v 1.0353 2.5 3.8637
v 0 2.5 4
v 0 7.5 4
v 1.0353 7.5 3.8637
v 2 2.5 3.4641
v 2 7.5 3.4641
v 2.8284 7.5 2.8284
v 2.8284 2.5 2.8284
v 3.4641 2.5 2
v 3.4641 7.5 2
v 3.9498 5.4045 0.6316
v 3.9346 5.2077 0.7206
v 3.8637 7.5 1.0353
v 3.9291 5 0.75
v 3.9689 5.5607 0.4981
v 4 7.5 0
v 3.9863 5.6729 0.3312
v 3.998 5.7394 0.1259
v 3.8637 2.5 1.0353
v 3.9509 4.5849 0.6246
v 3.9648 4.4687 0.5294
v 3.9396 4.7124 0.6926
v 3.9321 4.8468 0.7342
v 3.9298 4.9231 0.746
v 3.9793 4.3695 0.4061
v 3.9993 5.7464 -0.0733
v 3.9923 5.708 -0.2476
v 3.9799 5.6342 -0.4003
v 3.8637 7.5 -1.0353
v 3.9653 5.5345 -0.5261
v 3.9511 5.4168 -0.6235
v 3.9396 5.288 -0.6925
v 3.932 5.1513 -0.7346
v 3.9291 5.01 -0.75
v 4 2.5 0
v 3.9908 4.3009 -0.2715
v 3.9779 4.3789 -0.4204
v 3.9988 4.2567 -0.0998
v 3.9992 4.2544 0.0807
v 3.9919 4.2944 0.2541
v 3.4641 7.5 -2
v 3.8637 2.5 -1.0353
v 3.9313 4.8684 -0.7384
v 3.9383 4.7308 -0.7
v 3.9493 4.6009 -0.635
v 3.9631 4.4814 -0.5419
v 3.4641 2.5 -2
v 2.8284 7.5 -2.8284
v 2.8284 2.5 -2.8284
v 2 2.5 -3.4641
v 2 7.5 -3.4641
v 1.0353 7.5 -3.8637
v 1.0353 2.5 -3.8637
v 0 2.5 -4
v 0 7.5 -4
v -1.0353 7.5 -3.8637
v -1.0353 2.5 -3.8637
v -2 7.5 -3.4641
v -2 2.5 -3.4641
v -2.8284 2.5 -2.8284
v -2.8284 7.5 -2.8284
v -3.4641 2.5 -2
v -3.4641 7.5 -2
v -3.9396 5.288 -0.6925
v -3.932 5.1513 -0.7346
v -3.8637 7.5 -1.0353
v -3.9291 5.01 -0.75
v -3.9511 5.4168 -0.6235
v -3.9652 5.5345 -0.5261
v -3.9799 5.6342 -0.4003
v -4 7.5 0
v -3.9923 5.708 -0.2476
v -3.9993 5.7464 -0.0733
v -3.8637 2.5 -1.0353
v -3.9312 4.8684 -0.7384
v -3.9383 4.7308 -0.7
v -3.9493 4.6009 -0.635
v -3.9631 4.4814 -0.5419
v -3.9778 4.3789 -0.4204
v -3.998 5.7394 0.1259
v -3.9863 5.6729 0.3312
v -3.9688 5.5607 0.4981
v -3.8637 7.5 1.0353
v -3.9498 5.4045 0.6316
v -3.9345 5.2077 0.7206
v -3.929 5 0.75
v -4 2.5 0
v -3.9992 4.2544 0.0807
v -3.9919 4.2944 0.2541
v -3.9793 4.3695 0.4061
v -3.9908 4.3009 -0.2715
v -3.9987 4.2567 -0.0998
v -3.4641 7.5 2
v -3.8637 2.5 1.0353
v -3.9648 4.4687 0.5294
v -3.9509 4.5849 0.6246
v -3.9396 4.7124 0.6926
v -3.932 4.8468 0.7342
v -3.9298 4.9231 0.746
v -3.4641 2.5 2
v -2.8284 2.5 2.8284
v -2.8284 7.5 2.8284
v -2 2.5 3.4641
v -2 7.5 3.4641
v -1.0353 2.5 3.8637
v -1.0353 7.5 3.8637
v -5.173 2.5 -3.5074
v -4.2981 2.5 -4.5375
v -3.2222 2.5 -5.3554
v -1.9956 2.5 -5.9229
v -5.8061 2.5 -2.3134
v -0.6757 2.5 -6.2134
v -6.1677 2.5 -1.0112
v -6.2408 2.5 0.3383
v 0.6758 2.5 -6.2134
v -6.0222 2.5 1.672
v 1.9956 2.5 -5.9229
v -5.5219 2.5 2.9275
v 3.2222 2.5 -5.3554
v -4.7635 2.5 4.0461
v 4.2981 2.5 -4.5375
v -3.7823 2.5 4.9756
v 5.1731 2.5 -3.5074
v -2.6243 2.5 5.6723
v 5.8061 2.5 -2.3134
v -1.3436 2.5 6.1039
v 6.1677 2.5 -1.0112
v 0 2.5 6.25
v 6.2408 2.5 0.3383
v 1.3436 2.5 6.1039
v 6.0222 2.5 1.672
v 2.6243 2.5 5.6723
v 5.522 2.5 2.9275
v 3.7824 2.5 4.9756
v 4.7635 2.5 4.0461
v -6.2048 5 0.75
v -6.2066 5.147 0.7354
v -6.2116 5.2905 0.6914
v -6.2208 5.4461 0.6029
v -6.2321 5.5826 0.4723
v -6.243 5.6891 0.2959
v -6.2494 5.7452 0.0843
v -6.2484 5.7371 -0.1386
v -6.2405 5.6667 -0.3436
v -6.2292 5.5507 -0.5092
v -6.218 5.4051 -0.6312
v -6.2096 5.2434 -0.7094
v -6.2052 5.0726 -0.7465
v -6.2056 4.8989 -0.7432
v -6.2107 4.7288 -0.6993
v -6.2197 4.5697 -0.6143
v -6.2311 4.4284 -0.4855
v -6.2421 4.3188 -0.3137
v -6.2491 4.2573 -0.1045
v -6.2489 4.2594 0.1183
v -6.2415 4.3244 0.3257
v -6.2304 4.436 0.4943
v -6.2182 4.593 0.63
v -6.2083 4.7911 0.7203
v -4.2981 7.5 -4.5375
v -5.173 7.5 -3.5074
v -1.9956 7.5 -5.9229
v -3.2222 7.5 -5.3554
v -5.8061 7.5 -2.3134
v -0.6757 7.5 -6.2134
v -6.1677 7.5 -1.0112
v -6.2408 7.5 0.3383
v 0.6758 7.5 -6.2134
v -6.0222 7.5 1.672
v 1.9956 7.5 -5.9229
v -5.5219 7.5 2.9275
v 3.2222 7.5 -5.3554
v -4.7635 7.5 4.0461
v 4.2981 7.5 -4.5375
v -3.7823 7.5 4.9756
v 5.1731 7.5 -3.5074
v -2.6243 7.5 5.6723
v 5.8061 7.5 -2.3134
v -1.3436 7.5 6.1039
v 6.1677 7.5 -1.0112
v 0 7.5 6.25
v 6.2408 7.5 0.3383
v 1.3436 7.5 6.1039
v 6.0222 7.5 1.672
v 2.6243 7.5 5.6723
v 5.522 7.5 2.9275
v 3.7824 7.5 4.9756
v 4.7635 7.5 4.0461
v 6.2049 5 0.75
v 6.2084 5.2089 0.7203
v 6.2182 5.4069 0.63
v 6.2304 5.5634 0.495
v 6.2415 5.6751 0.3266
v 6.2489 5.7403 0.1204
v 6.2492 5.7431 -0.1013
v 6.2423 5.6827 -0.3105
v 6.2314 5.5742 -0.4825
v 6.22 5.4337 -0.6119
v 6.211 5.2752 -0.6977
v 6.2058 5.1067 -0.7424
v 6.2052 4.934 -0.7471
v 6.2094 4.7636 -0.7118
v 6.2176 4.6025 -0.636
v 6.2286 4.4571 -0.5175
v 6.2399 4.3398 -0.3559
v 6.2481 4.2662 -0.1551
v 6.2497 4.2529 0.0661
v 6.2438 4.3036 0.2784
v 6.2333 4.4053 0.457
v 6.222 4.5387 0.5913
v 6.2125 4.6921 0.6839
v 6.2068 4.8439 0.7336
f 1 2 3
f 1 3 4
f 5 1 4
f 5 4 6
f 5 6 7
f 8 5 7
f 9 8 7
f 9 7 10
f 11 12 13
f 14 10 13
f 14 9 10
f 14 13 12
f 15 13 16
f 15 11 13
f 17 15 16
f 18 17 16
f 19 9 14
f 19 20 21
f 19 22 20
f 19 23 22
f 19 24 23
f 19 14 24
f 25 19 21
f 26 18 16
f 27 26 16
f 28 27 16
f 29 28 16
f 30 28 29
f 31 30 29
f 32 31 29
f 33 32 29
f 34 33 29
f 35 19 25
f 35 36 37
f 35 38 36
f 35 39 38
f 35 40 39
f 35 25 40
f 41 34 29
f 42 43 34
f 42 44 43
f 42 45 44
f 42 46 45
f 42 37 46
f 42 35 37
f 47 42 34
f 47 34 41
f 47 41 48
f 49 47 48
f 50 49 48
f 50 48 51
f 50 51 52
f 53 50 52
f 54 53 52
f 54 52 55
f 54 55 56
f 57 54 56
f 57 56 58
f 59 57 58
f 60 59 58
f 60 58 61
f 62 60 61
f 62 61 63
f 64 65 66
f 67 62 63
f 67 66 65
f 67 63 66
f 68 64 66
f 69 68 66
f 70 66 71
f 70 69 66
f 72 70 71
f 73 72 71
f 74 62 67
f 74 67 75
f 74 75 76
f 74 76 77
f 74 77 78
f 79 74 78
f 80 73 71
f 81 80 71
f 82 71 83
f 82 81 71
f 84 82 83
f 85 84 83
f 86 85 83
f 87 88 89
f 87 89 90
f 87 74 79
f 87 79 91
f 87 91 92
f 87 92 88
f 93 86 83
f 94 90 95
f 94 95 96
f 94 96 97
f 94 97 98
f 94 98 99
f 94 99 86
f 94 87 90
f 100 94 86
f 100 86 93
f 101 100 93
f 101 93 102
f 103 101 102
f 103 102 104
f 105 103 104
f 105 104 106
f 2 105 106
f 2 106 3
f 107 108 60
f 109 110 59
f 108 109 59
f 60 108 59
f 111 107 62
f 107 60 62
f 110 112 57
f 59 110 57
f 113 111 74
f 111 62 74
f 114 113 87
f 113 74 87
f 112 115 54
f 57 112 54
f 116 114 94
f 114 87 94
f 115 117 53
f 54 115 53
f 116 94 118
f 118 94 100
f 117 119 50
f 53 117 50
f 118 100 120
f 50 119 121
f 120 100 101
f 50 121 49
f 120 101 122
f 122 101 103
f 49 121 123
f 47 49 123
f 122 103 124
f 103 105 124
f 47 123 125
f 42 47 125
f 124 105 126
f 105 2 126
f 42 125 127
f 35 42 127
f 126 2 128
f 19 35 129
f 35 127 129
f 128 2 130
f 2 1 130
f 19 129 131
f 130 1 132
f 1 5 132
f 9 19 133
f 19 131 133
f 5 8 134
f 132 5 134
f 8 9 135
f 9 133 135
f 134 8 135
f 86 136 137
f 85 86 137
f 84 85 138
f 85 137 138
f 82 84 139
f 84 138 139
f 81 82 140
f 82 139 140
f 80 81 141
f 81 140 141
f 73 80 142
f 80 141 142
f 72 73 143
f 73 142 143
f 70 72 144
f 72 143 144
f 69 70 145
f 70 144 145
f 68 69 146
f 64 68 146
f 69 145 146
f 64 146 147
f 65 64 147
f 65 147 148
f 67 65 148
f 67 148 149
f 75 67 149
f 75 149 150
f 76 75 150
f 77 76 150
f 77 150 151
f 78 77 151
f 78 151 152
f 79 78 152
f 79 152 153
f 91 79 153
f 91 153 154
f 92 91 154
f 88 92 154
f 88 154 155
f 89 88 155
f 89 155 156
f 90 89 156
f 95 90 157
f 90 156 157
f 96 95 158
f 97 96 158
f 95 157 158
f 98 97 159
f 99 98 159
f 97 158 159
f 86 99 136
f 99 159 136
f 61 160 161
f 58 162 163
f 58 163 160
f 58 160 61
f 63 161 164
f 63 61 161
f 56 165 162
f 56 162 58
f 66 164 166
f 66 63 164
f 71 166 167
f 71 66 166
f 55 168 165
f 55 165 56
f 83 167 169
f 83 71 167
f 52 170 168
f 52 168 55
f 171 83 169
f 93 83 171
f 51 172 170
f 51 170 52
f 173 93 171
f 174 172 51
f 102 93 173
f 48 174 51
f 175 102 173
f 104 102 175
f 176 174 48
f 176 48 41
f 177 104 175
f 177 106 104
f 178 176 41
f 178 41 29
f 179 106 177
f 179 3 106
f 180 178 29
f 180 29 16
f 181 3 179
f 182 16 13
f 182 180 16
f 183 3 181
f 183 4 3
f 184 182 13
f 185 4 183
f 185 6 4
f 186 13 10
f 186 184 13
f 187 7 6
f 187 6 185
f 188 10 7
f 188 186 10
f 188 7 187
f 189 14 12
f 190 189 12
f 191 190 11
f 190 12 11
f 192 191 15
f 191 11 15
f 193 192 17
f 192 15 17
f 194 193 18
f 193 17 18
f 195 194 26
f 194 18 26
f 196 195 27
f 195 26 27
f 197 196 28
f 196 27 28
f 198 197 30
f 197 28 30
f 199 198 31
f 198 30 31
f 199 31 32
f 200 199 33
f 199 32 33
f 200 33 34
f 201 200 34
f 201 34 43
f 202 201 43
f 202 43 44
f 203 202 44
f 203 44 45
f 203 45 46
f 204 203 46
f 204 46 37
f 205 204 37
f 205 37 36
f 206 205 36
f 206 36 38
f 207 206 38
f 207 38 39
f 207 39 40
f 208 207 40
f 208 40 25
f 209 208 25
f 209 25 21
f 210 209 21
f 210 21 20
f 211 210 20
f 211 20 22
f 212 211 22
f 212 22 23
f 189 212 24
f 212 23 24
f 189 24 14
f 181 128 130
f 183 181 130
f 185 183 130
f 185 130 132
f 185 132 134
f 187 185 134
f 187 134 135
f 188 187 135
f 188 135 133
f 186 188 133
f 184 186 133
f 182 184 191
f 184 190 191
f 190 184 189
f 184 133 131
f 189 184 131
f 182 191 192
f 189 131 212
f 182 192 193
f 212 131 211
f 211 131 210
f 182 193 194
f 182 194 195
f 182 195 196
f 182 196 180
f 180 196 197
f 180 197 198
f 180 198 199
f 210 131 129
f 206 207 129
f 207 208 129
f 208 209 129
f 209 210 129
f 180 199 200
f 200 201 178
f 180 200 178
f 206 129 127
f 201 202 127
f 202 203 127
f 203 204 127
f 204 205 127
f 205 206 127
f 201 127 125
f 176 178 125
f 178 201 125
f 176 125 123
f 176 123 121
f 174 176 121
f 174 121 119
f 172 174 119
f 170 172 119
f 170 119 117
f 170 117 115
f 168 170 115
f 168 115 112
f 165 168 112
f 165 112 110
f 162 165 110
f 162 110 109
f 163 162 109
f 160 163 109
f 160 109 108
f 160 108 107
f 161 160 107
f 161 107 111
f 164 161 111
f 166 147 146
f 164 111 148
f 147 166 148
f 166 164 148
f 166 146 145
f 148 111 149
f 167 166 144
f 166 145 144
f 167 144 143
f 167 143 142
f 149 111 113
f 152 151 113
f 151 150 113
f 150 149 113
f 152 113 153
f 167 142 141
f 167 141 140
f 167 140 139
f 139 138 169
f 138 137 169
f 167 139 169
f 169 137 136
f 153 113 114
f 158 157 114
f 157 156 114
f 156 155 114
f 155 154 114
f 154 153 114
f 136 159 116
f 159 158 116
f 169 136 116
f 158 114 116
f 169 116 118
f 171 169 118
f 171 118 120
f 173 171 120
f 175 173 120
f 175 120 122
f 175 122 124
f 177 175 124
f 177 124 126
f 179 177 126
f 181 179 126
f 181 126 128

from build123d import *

# Parameters (mm, degrees)
SKETCH1_R           = 12.5
SKETCH1_R_2         = 8
BOSS_EXTRUDE1_DEPTH = 10
SKETCH3_R           = 1.5
CUT_EXTRUDE1_DEPTH  = 30.685855218
ESCALA1_SCALE       = 0.5


with BuildPart() as part:
    # Sketch1 → Boss-Extrude1 (new body)
    with BuildSketch(Plane(origin=(0, 0, 0), x_dir=(1, 0, 0), z_dir=(0, 1, 0))):
        with Locations(Location((0, 0, 0), (0, 0, 270))):
            Circle(SKETCH1_R)
        with Locations(Location((0, 0, 0), (0, 0, 270))):
            Circle(SKETCH1_R_2, mode=Mode.SUBTRACT)
    extrude(amount=BOSS_EXTRUDE1_DEPTH)

    # Sketch3 → Cut-Extrude1 (cut, through all)
    with BuildSketch(Plane.ZY.offset(12.5)):
        with Locations((0, 5)):
            Circle(SKETCH3_R)
    extrude(amount=-CUT_EXTRUDE1_DEPTH, mode=Mode.SUBTRACT)


with BuildPart() as part_1:
    # Escala1: scaled about (2.9522e-05, 5.000004154, -4.1694e-05)
    add(part.part.scale(ESCALA1_SCALE).moved(Location((1.4761e-05, 2.500002077, -2.0847e-05))))


solid = part_1.part
